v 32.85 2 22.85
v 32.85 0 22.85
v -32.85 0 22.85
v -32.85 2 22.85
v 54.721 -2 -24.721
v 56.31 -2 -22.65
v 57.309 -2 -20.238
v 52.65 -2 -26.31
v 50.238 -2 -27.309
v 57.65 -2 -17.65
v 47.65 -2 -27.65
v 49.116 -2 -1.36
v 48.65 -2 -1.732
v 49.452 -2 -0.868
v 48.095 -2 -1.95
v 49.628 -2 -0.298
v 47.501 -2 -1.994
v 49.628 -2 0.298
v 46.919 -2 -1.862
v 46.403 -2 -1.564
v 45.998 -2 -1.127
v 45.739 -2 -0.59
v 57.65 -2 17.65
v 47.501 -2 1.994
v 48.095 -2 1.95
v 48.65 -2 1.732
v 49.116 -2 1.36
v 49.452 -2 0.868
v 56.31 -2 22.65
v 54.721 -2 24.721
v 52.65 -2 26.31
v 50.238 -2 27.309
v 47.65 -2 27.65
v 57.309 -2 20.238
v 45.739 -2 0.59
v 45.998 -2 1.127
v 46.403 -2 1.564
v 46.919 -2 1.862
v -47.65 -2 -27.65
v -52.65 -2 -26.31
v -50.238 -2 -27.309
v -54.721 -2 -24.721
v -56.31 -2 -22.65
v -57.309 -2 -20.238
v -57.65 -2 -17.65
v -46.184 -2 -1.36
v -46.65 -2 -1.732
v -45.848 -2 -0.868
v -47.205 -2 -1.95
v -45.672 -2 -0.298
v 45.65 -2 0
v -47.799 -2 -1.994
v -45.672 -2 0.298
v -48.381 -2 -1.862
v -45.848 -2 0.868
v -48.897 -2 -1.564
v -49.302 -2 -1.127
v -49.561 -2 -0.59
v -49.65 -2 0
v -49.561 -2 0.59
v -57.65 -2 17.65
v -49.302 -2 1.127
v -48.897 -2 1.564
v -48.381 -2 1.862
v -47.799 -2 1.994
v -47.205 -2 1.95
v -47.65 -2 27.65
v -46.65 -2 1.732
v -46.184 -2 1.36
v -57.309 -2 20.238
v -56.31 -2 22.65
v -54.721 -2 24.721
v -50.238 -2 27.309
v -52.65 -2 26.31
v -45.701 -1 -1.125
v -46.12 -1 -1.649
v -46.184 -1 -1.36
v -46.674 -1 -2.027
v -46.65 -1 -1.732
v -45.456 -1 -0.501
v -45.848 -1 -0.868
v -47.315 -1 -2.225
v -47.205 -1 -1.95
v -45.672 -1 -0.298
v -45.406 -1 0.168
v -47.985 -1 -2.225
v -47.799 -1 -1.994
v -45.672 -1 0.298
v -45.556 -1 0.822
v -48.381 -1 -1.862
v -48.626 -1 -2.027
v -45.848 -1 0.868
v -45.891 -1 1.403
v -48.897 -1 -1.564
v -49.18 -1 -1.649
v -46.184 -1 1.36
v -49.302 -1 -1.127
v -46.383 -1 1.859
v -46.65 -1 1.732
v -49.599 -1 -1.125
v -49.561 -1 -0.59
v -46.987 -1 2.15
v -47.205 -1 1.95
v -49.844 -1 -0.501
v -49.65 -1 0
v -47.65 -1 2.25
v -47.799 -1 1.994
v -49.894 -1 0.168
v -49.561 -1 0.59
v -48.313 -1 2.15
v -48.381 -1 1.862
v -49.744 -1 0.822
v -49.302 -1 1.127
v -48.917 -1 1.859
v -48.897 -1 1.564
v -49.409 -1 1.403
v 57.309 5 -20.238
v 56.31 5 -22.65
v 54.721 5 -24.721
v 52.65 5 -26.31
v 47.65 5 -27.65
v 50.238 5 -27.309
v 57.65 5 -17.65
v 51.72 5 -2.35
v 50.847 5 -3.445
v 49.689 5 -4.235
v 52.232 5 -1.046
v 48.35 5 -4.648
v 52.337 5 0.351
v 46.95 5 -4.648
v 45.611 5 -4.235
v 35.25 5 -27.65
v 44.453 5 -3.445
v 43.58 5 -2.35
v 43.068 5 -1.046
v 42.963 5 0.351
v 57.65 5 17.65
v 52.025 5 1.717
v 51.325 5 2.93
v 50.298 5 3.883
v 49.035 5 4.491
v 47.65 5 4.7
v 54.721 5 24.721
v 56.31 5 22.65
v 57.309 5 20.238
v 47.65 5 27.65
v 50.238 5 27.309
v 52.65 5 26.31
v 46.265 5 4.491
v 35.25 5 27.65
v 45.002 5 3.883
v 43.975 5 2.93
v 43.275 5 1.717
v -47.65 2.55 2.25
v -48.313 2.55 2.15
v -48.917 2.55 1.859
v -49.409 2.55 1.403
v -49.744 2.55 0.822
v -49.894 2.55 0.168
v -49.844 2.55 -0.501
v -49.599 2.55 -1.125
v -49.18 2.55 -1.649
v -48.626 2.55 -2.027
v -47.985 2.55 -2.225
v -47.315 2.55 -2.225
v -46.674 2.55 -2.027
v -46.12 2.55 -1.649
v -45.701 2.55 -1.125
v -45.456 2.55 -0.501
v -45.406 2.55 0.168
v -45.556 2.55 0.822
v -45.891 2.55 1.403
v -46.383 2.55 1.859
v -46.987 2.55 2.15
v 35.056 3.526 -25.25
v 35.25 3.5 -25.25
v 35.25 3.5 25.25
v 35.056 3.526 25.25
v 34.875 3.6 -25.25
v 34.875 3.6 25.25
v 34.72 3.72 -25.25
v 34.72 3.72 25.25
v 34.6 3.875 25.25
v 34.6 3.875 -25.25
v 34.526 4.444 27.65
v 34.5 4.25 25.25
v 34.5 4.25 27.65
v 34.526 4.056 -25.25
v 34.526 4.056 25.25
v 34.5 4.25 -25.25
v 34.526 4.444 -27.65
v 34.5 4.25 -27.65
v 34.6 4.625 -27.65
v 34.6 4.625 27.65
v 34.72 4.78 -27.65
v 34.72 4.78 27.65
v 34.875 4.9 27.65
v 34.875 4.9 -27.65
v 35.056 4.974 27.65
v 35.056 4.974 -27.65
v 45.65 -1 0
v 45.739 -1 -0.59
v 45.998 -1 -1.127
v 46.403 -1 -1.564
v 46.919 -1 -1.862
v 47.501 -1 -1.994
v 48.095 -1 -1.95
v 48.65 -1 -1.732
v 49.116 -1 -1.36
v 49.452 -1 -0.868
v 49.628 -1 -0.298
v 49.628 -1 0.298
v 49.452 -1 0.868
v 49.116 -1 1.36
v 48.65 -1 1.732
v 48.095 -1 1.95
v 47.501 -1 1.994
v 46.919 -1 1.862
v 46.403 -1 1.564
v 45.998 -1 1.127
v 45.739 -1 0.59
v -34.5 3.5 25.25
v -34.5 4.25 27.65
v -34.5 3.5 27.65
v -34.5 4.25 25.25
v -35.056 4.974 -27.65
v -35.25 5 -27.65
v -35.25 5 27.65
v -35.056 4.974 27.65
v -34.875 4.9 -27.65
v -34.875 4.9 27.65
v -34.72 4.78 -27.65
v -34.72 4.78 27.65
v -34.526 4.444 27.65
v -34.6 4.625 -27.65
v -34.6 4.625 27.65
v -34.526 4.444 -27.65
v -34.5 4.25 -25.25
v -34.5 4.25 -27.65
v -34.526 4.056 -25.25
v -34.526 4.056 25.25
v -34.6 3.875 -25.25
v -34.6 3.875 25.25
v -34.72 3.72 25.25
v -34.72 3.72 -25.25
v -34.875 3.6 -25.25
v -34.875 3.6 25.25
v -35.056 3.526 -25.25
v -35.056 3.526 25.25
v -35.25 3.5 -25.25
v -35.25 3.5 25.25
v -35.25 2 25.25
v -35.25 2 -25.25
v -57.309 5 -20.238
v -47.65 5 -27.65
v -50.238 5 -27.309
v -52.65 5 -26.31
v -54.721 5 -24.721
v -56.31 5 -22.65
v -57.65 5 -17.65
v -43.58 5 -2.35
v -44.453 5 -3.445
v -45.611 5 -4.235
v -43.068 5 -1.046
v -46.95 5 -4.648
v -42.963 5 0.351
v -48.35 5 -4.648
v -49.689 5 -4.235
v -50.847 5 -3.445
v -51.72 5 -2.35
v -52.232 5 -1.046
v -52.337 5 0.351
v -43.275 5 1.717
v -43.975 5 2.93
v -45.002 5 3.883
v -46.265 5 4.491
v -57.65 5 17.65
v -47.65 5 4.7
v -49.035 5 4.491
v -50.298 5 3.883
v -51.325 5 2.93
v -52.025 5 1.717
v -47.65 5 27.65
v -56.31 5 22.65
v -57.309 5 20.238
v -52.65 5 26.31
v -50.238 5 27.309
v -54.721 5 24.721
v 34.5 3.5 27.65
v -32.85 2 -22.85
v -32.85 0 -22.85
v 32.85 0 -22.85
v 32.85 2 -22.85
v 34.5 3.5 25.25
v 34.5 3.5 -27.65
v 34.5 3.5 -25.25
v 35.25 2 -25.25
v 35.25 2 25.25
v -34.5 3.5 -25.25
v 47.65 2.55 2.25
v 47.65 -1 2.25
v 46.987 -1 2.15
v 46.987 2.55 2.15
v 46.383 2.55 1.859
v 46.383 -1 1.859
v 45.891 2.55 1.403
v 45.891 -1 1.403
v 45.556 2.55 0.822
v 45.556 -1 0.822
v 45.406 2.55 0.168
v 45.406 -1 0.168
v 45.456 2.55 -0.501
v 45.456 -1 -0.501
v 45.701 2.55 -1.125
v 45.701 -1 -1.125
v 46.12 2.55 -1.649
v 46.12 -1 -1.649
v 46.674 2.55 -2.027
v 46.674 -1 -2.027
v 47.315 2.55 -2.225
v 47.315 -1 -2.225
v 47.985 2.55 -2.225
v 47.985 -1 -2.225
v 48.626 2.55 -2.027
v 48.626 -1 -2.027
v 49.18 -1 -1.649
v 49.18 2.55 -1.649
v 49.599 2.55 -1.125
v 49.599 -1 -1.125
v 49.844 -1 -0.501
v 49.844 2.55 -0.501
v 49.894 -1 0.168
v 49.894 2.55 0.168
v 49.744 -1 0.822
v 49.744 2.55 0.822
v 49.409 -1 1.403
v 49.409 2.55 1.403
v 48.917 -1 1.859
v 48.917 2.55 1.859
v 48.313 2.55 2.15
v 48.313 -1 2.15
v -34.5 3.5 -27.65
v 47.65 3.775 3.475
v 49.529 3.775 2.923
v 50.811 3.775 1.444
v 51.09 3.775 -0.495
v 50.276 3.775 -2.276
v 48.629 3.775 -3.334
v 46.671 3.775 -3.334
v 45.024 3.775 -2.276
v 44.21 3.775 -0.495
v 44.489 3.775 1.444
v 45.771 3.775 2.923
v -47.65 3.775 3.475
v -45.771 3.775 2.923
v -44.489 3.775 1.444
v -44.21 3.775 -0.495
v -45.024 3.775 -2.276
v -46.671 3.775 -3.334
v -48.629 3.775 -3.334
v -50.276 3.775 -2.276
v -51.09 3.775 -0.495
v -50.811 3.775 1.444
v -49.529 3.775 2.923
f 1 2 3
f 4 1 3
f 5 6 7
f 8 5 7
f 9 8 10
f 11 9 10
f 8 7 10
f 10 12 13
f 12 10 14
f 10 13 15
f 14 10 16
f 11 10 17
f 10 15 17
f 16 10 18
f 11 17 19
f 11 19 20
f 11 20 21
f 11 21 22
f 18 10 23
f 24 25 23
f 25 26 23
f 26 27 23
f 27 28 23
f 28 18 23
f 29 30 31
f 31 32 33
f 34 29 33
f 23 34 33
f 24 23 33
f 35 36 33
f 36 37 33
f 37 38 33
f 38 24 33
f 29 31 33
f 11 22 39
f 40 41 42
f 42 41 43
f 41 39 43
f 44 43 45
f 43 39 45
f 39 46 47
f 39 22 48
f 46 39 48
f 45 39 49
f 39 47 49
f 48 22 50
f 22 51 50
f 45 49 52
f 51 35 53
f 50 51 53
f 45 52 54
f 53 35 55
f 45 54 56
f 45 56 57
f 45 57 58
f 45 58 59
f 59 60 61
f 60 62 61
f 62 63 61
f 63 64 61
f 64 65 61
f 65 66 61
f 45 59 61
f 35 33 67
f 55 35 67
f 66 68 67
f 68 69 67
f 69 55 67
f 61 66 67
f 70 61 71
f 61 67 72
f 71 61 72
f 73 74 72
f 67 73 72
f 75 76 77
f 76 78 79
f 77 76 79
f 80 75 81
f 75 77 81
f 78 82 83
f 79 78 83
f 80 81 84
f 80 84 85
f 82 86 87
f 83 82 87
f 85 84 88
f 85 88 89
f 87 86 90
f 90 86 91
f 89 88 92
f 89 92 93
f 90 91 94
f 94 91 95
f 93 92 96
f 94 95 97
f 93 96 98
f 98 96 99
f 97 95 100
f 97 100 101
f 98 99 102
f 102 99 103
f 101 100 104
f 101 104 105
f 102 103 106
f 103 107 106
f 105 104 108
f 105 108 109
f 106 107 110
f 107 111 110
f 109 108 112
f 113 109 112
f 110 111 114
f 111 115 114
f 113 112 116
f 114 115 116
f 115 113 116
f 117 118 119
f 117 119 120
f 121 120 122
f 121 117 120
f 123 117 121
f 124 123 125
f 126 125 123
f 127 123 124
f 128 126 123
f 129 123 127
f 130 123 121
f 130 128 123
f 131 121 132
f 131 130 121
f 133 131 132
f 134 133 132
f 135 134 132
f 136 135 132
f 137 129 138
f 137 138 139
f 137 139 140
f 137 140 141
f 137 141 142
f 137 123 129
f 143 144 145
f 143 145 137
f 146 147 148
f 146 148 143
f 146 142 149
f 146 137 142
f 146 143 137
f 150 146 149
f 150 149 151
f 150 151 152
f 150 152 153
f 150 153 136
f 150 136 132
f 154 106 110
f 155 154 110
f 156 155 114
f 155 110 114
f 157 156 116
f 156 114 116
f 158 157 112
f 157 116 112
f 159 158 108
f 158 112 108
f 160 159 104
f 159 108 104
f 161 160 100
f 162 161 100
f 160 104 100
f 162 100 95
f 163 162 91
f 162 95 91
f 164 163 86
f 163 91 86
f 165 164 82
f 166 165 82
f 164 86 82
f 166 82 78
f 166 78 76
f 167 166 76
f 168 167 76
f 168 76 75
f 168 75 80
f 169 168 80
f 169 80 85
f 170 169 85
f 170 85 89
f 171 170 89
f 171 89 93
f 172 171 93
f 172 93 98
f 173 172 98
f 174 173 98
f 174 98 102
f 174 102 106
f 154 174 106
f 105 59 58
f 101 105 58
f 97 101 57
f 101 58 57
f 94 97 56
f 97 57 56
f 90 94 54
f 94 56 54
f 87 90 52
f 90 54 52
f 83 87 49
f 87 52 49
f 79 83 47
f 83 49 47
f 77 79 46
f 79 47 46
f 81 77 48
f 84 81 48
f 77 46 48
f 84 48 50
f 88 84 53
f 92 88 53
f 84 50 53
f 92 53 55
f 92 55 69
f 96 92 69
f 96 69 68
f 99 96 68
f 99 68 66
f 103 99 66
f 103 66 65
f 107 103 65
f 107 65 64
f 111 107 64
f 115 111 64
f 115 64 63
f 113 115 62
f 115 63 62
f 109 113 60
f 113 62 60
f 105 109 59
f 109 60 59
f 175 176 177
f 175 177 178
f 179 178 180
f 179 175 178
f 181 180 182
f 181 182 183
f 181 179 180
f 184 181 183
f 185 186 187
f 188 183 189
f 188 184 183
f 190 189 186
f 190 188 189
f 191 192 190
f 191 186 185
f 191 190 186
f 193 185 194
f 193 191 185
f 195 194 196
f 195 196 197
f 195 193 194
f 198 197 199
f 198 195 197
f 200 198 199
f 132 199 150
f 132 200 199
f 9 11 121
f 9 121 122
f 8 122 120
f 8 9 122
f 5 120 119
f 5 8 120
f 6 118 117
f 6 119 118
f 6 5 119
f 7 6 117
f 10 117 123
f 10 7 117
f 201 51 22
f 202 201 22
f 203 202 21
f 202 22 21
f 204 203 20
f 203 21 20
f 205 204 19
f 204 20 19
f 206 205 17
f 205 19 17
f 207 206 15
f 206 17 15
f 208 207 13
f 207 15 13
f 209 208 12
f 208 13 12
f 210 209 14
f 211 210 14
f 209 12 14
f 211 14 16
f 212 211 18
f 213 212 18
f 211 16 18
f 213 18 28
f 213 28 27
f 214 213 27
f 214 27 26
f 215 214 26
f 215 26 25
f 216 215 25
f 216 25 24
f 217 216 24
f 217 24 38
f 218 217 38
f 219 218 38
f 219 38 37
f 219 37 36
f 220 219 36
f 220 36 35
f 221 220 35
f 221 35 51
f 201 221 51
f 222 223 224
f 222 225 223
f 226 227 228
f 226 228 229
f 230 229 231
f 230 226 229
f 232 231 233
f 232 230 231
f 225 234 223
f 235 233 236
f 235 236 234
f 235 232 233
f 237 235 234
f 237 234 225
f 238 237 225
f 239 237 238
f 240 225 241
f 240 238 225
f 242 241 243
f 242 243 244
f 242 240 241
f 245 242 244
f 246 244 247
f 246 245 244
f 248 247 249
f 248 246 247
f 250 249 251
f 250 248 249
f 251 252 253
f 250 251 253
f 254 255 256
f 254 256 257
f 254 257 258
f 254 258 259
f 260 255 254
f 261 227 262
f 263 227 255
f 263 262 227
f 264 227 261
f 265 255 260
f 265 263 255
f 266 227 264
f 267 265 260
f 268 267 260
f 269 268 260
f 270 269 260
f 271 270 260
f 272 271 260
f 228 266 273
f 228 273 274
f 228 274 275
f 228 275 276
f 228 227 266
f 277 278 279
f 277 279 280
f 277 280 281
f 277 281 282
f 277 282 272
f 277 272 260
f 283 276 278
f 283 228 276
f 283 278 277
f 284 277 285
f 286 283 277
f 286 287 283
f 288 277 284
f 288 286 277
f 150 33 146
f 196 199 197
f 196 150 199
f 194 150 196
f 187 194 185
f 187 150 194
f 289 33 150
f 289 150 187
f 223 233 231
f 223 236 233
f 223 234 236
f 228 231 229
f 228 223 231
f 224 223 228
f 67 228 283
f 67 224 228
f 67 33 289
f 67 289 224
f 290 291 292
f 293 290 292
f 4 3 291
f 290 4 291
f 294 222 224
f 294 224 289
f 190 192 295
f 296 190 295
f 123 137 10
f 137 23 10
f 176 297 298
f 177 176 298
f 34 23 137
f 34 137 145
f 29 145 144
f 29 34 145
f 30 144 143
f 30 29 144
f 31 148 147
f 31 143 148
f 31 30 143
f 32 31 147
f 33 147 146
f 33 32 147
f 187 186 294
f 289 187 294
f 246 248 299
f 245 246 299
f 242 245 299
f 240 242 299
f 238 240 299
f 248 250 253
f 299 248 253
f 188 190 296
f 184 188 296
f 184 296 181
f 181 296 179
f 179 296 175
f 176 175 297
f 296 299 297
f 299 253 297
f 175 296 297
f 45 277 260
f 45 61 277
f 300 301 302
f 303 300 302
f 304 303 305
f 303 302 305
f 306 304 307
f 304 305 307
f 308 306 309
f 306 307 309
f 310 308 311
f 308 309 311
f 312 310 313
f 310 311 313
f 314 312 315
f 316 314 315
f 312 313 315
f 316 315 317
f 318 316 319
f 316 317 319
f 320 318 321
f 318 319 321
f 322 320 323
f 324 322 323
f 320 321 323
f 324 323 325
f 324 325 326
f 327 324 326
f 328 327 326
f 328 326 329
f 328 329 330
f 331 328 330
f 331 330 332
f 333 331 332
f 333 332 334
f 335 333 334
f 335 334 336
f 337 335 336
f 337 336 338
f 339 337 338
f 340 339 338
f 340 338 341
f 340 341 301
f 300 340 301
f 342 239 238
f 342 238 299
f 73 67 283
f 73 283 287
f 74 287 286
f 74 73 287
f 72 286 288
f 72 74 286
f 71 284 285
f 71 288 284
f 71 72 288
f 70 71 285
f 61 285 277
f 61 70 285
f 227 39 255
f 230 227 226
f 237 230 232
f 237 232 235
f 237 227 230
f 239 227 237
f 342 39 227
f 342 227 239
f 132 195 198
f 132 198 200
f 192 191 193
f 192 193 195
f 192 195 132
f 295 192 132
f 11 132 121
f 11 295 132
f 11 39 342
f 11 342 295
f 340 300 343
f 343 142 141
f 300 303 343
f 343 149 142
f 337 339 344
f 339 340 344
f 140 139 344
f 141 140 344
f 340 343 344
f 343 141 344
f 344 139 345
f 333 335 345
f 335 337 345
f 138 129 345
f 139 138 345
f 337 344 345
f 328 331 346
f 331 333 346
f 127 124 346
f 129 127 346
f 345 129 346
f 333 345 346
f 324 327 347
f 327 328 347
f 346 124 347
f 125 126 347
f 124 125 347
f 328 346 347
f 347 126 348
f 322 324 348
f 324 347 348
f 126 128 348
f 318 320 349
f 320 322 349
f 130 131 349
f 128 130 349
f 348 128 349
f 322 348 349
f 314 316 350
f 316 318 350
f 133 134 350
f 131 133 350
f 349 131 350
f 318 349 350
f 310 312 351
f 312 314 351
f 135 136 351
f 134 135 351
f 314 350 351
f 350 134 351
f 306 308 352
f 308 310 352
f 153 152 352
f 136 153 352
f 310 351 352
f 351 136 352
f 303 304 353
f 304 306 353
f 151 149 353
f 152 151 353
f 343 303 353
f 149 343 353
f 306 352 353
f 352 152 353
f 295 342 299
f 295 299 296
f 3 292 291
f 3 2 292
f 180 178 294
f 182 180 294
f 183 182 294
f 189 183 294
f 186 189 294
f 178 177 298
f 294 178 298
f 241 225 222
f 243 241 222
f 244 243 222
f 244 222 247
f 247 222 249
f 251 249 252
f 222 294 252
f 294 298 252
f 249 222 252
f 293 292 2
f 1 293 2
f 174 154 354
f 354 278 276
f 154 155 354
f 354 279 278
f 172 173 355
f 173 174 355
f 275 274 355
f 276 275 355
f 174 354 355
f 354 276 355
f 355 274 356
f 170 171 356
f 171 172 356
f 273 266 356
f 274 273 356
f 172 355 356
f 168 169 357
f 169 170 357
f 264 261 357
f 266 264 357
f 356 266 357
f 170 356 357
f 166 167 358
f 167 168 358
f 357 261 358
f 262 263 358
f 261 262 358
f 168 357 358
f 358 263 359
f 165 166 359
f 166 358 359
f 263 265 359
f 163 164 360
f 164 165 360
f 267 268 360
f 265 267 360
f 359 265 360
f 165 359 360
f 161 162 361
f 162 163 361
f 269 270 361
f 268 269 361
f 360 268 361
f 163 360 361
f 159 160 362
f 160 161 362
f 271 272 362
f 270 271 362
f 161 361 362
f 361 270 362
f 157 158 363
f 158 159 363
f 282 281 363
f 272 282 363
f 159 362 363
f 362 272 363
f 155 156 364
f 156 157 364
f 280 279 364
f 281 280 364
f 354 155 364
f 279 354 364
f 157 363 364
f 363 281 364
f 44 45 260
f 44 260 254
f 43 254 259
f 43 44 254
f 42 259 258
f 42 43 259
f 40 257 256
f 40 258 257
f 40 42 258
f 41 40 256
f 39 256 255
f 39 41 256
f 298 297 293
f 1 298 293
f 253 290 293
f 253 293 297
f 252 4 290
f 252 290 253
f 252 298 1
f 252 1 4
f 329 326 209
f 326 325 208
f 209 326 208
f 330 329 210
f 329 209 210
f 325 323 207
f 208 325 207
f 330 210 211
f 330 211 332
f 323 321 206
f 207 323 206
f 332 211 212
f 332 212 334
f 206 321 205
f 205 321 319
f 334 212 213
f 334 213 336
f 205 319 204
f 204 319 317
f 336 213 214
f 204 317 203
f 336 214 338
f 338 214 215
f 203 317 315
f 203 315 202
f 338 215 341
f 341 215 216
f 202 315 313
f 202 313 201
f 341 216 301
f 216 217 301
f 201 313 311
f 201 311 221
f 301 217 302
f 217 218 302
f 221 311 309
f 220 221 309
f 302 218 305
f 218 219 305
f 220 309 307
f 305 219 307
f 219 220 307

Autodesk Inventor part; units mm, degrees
ref_plane "YZ Plane" through (0, 0, 0) normal (1, 0, 0) x (0, 1, 0)
ref_plane "XZ Plane" through (0, 0, 0) normal (0, 1, 0) x (-1, 0, 0)
ref_plane "XY Plane" through (0, 0, 0) normal (0, 0, 1) x (1, 0, 0)
sketch "Skizze1" plane through (0, 0, 0) normal (0, 1, 0) x (-1, 0, 0)
  line L0 (35.25, -25.25) -> (-35.25, -25.25)
  line L1 (-35.25, -25.25) -> (-35.25, 25.25)
  line L2 (-35.25, 25.25) -> (35.25, 25.25)
  line L3 (35.25, 25.25) -> (35.25, -25.25)
  line L4 (35.25, -25.25) -> (-35.25, 25.25) construction
  line L5 (-35.25, -25.25) -> (35.25, 25.25) construction
  line L6 (37.65, -27.65) -> (-37.65, -27.65)
  line L7 (-37.65, -27.65) -> (-37.65, 27.65)
  line L8 (-37.65, 27.65) -> (37.65, 27.65)
  line L9 (37.65, 27.65) -> (37.65, -27.65)
  line L10 (32.85, -22.85) -> (-32.85, -22.85)
  line L11 (-32.85, -22.85) -> (-32.85, 22.85)
  line L12 (-32.85, 22.85) -> (32.85, 22.85)
  line L13 (32.85, 22.85) -> (32.85, -22.85)
  line L14 (47.65, -27.65) -> (37.65, -27.65)
  line L15 (37.65, 27.65) -> (47.65, 27.65)
  circle A0 centre (47.65, 0) radius 2
  line L16 (-37.65, -27.65) -> (-47.65, -27.65)
  line L17 (-37.65, 27.65) -> (-47.65, 27.65)
  circle A1 centre (-47.65, 0) radius 2
  arc A2 (-47.65, 27.65) -> (-57.65, 17.65) centre (-47.65, 17.65) ccw
  arc A3 (-57.65, -17.65) -> (-47.65, -27.65) centre (-47.65, -17.65) ccw
  line L18 (-57.65, 17.65) -> (-57.65, -17.65)
  arc A4 (57.65, 17.65) -> (47.65, 27.65) centre (47.65, 17.65) ccw
  arc A5 (47.65, -27.65) -> (57.65, -17.65) centre (47.65, -17.65) ccw
  line L19 (57.65, 17.65) -> (57.65, -17.65)
  point P0 (0, 0)
  point P1 (86.5572, 0)
  point P2 (-87.7335, 0)
  point P3 (57.65, 0)
  point P4 (-57.65, 0)
  dimension "d0" = 70.5
  dimension "d1" = 50.5
  dimension "d2" = 2.4
  dimension "d3" = 2.4
  dimension "d4" = 4
  dimension "d7" = 4
  dimension "d28" = 20
  dimension "d29" = 20
  dimension "d30" = 10
  dimension "d31" = 10
  dimension "d32" = 10
  dimension "d33" = 10
extrude "Extrusion1" add sketch "Skizze1" against normal blind 2 contours L0 L1 L2 L3 | L6 L7 L8 L9 | L9 L15 A4 L19 A5 L14 | L16 A3 L18 A2 L17 L7 | L10 L11 L12 L13
extrude "Extrusion2" add sketch "Skizze1" along normal blind 5 contours L6 L7 L8 L9 | L9 L15 A4 L19 A5 L14 | L16 A3 L18 A2 L17 L7
extrude "Extrusion3" add sketch "Skizze1" along normal blind 2 contours L0 L1 L2 L3
sketch "Skizze2" plane through (0, 0, 0) normal (0, 0, 1) x (1, 0, 0)
  line L0 (32.85, 0) -> (32.85, 2) projected
  line L1 (32.85, 2) -> (35.25, 2) projected
  line L2 (35.25, 2) -> (35.25, 5) projected
  line L3 (35.25, 5) -> (45.65, 5) projected
  line L4 (45.65, 5) -> (45.65, -2) projected
  line L5 (45.65, -2) -> (-45.65, -2) projected
  line L6 (-45.65, -2) -> (-45.65, 5) projected
  line L7 (-45.65, 5) -> (-35.25, 5) projected
  line L8 (-35.25, 5) -> (-35.25, 2) projected
  line L9 (-35.25, 2) -> (-32.85, 2) projected
  line L10 (-32.85, 2) -> (-32.85, 0) projected
  line L11 (-32.85, 0) -> (32.85, 0) projected
  line L12 (-57.65, 5) -> (-49.65, 5) projected
  line L13 (-49.65, 5) -> (-49.65, -2) projected
  line L14 (-49.65, -2) -> (-57.65, -2) projected
  line L15 (49.65, 5) -> (57.65, 5) projected
  line L16 (57.65, -2) -> (49.65, -2) projected
  line L17 (49.65, -2) -> (49.65, 5) projected
  arc A0 (-35.25, 3.5) -> (-35.25, 5) centre (-35.25, 4.25) ccw
  arc A1 (35.25, 5) -> (35.25, 3.5) centre (35.25, 4.25) ccw
  line L18 (-35.25, 5) -> (-35.25, 3.5)
  line L19 (35.25, 5) -> (35.25, 3.5)
  line L20 (-34.5, 4.25) -> (-34.5, 3.5)
  line L21 (-35.25, 2) -> (35.25, 2) projected
  line L22 (35.25, 2) -> (35.25, 5) projected
  line L23 (-35.25, 3.5) -> (35.25, 3.5)
  line L24 (-35.25, 5) -> (35.25, 5)
  line L25 (47.65, 5) -> (-47.65, 5) projected
  line L26 (34.5, 4.25) -> (34.5, 3.5)
  line L27 (-57.65, -2) -> (-57.65, 5) projected
  line L28 (57.65, 5) -> (57.65, -2) projected
  point P0 (0, 0)
  point P1 (39.5, 3.725)
  point P2 (39.8372, 3.6239)
  point P3 (-39.5, 3.725)
  point P4 (-39.8372, 3.6239)
  dimension "d14" = 1.5
  dimension "d15" = 1.5
extrude "Extrusion4" add sketch "Skizze2" along normal mid plane 50.5 contours A1 L2 | L8 A0
extrude "Extrusion5" cut sketch "Skizze2" along normal through all both and the other way through all contours A1 L26 L23 L20 A0 L24
sketch "Skizze3" plane through (0, 5, 0) normal (0, 1, 0) x (1, 0, 0)
  circle A0 centre (-47.65, 0) radius 2 projected
  circle A1 centre (47.65, 0) radius 2 projected
  point P0 (0, 0)
hole "Bohrung1" at (-47.65, 5, 0) at (47.65, 5, 0) direction (0, -1, 0) diameter 4.5 depth 6 countersink diameter 9.4 countersink angle 90 clearance for "Flachkopfsenkschraube DIN EN ISO 2009" size "M4" standard "DIN"
equation "\"d7\" = d4"
equation "\"d29\" = d28"
equation "\"d32\" = d31"
equation "\"d33\" = d30"
equation "\"d15\" = d14"
properties part number "PCB_Holder_B"
